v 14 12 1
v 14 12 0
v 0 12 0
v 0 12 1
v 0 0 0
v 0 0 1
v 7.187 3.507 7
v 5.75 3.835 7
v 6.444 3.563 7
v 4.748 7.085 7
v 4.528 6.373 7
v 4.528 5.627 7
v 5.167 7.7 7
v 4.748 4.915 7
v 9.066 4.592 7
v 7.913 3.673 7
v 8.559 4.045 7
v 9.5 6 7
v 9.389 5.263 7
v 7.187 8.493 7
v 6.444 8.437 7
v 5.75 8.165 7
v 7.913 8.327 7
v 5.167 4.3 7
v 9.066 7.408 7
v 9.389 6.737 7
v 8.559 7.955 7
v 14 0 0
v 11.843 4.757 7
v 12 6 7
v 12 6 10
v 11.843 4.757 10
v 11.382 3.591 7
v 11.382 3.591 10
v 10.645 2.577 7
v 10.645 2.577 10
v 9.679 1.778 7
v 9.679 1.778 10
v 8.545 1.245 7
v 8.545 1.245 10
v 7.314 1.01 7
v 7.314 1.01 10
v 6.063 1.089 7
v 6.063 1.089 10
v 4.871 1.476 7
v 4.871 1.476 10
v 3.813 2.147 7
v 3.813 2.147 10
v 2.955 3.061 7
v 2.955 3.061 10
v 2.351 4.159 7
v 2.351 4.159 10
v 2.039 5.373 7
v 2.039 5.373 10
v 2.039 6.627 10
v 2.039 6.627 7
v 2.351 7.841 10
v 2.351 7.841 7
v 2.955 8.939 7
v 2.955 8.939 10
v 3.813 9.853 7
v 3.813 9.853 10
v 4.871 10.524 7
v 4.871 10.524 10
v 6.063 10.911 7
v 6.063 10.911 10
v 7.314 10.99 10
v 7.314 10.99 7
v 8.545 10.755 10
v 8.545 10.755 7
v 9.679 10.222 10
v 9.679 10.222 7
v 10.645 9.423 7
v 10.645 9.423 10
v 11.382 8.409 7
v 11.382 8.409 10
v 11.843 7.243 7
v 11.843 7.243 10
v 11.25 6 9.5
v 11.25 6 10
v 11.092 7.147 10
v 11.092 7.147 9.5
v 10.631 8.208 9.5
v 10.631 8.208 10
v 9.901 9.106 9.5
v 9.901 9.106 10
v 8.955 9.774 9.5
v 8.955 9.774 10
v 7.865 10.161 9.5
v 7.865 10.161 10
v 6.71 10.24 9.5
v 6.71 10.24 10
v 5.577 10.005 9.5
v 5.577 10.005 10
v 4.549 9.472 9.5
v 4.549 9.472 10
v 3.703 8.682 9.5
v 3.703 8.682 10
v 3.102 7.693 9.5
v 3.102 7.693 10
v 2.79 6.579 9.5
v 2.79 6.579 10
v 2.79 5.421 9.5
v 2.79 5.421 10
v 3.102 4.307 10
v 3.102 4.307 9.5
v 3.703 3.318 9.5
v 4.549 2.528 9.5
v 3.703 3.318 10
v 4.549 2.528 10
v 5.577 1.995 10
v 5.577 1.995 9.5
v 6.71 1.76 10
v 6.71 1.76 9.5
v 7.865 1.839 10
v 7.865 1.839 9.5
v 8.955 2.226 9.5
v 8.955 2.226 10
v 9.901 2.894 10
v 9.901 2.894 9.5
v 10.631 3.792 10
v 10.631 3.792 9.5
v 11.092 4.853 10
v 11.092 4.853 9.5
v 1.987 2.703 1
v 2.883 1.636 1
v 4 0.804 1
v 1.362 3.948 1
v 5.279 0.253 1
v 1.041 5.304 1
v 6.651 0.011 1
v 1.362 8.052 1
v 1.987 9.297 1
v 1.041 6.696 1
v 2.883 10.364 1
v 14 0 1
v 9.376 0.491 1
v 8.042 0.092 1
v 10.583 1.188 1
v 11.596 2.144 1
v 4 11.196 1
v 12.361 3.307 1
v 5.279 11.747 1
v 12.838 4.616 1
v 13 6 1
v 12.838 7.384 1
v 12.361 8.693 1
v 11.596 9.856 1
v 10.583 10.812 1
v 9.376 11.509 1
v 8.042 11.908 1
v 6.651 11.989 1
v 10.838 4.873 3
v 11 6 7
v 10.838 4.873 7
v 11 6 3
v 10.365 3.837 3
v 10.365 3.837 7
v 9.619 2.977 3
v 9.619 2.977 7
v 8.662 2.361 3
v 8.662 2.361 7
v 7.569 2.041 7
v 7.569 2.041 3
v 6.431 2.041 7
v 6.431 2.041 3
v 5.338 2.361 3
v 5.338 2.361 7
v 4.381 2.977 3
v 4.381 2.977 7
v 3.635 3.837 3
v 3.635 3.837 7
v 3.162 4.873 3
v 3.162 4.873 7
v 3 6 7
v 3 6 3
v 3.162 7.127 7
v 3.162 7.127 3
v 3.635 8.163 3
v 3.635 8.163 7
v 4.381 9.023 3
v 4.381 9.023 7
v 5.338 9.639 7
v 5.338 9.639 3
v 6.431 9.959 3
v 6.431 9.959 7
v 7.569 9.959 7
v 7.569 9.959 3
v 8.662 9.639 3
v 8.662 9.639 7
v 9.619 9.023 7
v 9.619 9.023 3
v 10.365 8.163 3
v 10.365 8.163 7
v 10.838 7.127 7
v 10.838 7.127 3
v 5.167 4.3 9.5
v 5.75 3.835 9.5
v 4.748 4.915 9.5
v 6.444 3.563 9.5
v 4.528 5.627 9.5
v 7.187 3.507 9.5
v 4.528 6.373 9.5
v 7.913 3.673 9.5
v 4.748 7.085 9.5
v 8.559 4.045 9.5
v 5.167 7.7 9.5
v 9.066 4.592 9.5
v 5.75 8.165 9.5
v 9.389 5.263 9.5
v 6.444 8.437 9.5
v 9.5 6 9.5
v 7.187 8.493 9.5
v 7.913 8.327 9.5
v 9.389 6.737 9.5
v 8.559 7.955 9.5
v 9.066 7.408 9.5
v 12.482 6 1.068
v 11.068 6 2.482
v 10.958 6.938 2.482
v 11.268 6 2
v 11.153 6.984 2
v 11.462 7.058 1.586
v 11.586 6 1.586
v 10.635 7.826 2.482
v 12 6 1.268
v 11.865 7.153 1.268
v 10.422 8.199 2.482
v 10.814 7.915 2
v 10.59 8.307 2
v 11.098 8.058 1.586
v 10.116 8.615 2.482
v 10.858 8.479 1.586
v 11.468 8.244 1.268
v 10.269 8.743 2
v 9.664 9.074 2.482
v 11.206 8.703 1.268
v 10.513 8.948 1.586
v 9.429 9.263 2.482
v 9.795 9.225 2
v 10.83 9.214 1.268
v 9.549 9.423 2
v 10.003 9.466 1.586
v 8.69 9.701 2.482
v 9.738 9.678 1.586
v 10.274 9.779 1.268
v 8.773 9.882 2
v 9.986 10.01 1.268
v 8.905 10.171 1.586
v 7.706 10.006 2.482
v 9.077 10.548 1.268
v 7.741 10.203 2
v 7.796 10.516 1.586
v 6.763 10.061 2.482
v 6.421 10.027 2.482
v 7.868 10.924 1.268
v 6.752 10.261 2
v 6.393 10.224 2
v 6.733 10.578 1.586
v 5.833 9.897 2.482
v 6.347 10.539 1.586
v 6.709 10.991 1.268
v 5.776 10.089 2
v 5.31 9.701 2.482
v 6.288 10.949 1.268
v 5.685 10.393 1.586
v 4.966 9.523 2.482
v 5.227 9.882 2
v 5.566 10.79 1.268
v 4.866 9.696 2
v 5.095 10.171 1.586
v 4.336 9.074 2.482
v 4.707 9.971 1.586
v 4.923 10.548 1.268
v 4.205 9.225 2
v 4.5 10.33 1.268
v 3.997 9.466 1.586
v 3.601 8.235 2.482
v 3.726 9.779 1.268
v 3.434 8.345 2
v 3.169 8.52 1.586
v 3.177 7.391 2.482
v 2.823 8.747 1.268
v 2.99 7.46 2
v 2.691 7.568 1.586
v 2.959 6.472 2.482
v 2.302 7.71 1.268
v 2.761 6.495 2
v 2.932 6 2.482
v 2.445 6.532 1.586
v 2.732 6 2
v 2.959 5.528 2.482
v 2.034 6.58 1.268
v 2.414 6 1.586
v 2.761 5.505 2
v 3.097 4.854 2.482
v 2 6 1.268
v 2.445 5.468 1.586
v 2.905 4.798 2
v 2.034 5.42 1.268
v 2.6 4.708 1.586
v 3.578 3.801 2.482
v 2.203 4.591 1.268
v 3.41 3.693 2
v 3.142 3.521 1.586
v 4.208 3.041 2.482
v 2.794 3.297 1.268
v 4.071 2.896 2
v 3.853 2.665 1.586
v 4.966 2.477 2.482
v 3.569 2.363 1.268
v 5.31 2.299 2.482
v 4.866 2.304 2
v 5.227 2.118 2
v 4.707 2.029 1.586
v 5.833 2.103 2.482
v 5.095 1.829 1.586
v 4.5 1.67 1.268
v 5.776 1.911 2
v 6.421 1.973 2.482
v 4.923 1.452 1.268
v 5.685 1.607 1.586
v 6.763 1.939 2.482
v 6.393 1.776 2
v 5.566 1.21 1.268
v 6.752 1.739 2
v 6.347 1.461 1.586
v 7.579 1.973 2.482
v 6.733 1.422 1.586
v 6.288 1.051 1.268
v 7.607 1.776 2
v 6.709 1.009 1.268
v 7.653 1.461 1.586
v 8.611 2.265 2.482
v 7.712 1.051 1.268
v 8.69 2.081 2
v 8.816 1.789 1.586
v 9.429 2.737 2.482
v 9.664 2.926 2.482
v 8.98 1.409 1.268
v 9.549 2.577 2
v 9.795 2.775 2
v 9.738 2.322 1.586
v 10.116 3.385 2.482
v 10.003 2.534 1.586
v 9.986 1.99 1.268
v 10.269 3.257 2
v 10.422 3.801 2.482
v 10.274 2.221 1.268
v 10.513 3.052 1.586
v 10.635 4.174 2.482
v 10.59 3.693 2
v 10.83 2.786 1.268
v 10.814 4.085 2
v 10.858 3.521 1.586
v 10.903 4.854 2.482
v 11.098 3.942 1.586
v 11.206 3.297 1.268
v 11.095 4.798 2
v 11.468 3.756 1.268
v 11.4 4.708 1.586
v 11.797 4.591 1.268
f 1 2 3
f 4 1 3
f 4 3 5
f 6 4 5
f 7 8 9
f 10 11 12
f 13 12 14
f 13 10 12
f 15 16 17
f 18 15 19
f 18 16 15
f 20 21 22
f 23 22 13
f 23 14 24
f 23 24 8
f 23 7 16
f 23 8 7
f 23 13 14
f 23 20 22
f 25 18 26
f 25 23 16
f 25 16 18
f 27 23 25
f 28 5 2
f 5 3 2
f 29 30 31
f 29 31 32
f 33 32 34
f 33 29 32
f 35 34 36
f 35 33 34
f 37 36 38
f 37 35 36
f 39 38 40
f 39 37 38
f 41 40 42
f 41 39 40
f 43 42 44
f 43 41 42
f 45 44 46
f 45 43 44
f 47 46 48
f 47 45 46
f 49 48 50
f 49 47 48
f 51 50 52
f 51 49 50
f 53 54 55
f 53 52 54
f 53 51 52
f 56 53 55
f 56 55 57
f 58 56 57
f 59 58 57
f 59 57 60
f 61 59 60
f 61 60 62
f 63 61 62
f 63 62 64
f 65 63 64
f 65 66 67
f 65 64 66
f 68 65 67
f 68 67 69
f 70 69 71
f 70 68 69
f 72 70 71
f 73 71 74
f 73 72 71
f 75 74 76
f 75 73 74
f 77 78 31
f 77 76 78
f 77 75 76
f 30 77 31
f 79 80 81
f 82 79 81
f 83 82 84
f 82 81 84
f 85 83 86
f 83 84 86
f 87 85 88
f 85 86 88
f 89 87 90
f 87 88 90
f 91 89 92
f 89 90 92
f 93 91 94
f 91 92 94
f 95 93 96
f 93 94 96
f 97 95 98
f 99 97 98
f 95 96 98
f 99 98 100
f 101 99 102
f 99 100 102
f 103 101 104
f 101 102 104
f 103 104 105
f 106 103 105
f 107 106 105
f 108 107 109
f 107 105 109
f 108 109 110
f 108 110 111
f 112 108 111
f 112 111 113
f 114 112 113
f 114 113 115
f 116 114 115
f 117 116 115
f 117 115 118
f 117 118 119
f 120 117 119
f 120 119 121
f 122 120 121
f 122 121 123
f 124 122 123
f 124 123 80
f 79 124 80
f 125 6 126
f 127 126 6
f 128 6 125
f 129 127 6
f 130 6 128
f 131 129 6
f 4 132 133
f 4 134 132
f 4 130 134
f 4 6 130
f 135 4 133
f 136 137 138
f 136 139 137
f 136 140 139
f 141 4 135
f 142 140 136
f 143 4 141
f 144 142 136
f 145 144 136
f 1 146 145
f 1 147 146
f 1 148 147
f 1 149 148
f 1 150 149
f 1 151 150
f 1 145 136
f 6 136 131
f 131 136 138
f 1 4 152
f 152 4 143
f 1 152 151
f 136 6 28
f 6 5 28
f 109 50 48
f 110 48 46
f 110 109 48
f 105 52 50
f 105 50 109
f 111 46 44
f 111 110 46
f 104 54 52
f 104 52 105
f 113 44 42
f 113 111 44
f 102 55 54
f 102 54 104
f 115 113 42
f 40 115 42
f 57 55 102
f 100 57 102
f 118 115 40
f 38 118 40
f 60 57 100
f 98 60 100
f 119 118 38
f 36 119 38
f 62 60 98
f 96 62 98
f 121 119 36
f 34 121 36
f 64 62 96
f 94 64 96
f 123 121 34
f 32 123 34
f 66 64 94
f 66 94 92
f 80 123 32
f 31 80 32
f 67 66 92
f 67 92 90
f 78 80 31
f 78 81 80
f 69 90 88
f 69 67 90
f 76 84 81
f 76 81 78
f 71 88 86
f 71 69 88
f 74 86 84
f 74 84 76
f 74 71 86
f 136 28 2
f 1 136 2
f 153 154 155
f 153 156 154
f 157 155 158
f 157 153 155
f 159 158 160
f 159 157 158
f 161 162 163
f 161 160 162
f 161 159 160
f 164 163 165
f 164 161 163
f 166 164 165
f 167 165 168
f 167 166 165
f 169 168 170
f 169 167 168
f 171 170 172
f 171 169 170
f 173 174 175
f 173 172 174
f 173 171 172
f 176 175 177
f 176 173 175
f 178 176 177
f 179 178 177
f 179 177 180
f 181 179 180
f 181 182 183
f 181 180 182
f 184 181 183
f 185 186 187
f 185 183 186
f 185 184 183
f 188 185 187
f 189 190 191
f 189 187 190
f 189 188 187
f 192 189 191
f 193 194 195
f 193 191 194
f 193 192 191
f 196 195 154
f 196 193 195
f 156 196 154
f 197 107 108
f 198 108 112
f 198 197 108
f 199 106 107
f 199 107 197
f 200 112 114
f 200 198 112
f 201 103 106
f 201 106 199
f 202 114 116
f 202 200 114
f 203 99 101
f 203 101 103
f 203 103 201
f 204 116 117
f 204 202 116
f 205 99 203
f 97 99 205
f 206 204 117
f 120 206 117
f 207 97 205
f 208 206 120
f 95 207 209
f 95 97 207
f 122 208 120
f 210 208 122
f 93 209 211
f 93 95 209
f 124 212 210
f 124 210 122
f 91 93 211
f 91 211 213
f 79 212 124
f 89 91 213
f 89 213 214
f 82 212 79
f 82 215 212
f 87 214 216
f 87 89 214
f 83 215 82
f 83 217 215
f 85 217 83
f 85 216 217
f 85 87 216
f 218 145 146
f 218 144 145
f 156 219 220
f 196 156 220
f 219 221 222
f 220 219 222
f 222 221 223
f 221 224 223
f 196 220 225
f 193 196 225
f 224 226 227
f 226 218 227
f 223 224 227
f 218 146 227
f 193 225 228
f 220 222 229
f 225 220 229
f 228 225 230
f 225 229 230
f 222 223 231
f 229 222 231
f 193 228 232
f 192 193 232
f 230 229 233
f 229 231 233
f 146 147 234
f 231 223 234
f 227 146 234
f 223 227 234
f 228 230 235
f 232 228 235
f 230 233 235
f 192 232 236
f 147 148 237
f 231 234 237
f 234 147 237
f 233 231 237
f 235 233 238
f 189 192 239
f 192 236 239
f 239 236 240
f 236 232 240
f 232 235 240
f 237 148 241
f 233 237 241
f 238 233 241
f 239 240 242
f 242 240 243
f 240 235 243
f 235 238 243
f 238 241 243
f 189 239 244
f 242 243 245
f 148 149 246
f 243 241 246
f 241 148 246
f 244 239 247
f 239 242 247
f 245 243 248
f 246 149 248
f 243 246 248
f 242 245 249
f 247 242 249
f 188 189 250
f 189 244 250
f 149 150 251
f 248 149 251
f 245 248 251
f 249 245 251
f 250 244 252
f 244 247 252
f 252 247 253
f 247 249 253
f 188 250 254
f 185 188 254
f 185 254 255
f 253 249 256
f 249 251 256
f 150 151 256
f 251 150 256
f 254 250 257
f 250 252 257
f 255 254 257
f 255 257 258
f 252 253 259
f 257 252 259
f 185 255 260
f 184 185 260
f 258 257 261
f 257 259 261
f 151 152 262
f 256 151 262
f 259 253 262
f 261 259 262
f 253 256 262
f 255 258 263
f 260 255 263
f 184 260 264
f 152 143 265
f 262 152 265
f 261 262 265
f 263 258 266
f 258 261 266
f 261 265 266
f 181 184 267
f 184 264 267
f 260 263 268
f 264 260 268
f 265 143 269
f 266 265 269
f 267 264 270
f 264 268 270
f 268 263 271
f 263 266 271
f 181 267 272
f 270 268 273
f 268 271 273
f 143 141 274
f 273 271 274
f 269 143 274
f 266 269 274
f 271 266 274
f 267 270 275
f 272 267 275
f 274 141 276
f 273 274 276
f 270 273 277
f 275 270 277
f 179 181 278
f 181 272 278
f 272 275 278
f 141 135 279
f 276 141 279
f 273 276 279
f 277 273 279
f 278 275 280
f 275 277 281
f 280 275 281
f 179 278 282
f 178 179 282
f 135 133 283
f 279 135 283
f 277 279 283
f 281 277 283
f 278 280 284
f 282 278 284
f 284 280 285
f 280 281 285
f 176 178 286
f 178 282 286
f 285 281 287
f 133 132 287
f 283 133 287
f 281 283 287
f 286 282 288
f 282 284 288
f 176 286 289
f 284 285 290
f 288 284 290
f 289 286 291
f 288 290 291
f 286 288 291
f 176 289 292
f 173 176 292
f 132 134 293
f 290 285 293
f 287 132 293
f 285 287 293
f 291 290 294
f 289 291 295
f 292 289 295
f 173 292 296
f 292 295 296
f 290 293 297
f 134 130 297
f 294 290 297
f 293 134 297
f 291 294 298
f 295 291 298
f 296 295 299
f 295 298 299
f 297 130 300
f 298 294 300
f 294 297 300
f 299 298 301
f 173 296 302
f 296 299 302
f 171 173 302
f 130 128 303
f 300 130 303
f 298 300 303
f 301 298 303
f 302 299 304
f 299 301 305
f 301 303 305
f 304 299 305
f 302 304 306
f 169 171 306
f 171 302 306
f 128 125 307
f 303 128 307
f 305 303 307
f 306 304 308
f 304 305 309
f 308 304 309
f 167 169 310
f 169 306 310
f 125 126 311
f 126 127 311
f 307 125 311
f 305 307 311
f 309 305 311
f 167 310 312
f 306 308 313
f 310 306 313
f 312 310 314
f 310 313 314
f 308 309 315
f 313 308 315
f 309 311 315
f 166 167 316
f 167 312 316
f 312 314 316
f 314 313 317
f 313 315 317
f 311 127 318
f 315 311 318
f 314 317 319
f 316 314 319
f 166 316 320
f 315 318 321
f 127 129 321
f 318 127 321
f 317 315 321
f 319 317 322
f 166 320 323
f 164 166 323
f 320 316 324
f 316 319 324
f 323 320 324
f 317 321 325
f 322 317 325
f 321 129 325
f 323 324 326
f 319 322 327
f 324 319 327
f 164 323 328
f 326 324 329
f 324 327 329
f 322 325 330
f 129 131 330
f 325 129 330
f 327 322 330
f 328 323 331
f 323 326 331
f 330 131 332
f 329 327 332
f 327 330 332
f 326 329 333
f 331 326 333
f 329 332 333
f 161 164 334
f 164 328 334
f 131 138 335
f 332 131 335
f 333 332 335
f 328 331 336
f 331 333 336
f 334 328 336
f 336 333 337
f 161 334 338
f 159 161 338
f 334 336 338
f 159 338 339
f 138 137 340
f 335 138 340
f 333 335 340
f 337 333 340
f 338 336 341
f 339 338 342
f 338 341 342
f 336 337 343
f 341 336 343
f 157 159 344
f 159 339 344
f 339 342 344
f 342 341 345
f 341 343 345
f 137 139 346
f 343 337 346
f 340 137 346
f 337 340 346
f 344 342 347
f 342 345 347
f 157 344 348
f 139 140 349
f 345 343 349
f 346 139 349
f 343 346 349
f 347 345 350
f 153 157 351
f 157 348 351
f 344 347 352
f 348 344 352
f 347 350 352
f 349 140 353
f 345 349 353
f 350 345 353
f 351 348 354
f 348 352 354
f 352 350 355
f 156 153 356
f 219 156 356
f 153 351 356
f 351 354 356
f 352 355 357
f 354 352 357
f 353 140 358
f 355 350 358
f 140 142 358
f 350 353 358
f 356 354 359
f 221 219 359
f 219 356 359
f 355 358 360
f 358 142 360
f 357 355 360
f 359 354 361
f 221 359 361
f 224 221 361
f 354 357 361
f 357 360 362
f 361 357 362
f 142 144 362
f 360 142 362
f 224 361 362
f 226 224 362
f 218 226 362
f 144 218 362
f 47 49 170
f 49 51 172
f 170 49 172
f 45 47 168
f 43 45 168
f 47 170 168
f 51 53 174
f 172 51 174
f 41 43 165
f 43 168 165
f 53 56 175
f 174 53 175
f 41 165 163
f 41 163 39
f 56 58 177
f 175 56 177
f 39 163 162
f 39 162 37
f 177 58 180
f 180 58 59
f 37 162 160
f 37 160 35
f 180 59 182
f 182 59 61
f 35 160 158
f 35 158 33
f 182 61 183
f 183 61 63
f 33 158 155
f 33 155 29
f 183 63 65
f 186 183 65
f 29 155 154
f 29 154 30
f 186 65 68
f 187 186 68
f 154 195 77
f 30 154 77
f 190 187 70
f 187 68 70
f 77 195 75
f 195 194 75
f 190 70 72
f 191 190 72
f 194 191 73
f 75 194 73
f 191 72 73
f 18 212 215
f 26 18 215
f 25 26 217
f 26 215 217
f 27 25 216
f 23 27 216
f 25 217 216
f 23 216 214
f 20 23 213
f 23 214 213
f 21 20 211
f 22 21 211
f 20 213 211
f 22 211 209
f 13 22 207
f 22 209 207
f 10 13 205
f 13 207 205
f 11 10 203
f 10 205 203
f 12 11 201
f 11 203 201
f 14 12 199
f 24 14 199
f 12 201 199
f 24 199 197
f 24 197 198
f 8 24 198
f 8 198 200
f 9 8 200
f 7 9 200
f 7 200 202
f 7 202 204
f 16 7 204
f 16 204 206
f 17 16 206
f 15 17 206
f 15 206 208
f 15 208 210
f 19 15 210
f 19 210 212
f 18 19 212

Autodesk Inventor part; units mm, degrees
ref_plane "YZ Plane" through (0, 0, 0) normal (1, 0, 0) x (0, 1, 0)
ref_plane "XZ Plane" through (0, 0, 0) normal (0, 1, 0) x (-1, 0, 0)
ref_plane "XY Plane" through (0, 0, 0) normal (0, 0, 1) x (1, 0, 0)
sketch "Sketch1" plane through (0, 0, 0) normal (0, 0, 1) x (1, 0, 0)
  line L0 (0, 0) -> (14, 0)
  line L1 (14, 0) -> (14, 12)
  line L2 (14, 12) -> (0, 12)
  line L3 (0, 12) -> (0, 0)
  dimension "d0" = 14
  dimension "d1" = 12
extrude "Extrusion1" add sketch "Sketch1" along normal blind 1
sketch "Sketch2" plane through (0, 0, 1) normal (0, 0, 1) x (1, 0, 0)
  line L0 (0, 0) -> (14, 0) construction
  line L1 (14, 0) -> (14, 12) construction
  line L2 (14, 12) -> (0, 12) construction
  line L3 (0, 12) -> (0, 0) construction
  circle A0 centre (7, 6) radius 4
  dimension "d4" = 8
extrude "Extrusion2" add sketch "Sketch2" along normal blind 6
sketch "Sketch3" plane through (7, 6, 7) normal (0, 0, 1) x (1, 0, 0)
  circle A0 centre (0, 0) radius 5
  circle A1 centre (0, 0) radius 3
  circle A2 centre (0, 0) radius 4
  point P0 (-7, -6)
  dimension "d7" = 10
  dimension "d8" = 6
extrude "Extrusion3" add sketch "Sketch3" along normal blind 3 contours A0 | A1 | A2
sketch "Sketch4" plane through (7, 6, 10) normal (0, 0, 1) x (1, 0, 0)
  circle A0 centre (0, 0) radius 2.5
  circle A1 centre (0, 0) radius 4.25
  circle A2 centre (0, 0) radius 5 projected
  point P0 (-7, -6)
  dimension "d11" = 5
  dimension "d12" = 8.5
extrude "Extrusion4" cut sketch "Sketch4" against normal blind 3 contours A0
extrude "Extrusion5" cut sketch "Sketch4" against normal blind 0.5 contours A1
fillet "Fillet1" radius 2 1 edges at (3, 6, 1)
properties part number "Camera" material "ABS Plastic"
